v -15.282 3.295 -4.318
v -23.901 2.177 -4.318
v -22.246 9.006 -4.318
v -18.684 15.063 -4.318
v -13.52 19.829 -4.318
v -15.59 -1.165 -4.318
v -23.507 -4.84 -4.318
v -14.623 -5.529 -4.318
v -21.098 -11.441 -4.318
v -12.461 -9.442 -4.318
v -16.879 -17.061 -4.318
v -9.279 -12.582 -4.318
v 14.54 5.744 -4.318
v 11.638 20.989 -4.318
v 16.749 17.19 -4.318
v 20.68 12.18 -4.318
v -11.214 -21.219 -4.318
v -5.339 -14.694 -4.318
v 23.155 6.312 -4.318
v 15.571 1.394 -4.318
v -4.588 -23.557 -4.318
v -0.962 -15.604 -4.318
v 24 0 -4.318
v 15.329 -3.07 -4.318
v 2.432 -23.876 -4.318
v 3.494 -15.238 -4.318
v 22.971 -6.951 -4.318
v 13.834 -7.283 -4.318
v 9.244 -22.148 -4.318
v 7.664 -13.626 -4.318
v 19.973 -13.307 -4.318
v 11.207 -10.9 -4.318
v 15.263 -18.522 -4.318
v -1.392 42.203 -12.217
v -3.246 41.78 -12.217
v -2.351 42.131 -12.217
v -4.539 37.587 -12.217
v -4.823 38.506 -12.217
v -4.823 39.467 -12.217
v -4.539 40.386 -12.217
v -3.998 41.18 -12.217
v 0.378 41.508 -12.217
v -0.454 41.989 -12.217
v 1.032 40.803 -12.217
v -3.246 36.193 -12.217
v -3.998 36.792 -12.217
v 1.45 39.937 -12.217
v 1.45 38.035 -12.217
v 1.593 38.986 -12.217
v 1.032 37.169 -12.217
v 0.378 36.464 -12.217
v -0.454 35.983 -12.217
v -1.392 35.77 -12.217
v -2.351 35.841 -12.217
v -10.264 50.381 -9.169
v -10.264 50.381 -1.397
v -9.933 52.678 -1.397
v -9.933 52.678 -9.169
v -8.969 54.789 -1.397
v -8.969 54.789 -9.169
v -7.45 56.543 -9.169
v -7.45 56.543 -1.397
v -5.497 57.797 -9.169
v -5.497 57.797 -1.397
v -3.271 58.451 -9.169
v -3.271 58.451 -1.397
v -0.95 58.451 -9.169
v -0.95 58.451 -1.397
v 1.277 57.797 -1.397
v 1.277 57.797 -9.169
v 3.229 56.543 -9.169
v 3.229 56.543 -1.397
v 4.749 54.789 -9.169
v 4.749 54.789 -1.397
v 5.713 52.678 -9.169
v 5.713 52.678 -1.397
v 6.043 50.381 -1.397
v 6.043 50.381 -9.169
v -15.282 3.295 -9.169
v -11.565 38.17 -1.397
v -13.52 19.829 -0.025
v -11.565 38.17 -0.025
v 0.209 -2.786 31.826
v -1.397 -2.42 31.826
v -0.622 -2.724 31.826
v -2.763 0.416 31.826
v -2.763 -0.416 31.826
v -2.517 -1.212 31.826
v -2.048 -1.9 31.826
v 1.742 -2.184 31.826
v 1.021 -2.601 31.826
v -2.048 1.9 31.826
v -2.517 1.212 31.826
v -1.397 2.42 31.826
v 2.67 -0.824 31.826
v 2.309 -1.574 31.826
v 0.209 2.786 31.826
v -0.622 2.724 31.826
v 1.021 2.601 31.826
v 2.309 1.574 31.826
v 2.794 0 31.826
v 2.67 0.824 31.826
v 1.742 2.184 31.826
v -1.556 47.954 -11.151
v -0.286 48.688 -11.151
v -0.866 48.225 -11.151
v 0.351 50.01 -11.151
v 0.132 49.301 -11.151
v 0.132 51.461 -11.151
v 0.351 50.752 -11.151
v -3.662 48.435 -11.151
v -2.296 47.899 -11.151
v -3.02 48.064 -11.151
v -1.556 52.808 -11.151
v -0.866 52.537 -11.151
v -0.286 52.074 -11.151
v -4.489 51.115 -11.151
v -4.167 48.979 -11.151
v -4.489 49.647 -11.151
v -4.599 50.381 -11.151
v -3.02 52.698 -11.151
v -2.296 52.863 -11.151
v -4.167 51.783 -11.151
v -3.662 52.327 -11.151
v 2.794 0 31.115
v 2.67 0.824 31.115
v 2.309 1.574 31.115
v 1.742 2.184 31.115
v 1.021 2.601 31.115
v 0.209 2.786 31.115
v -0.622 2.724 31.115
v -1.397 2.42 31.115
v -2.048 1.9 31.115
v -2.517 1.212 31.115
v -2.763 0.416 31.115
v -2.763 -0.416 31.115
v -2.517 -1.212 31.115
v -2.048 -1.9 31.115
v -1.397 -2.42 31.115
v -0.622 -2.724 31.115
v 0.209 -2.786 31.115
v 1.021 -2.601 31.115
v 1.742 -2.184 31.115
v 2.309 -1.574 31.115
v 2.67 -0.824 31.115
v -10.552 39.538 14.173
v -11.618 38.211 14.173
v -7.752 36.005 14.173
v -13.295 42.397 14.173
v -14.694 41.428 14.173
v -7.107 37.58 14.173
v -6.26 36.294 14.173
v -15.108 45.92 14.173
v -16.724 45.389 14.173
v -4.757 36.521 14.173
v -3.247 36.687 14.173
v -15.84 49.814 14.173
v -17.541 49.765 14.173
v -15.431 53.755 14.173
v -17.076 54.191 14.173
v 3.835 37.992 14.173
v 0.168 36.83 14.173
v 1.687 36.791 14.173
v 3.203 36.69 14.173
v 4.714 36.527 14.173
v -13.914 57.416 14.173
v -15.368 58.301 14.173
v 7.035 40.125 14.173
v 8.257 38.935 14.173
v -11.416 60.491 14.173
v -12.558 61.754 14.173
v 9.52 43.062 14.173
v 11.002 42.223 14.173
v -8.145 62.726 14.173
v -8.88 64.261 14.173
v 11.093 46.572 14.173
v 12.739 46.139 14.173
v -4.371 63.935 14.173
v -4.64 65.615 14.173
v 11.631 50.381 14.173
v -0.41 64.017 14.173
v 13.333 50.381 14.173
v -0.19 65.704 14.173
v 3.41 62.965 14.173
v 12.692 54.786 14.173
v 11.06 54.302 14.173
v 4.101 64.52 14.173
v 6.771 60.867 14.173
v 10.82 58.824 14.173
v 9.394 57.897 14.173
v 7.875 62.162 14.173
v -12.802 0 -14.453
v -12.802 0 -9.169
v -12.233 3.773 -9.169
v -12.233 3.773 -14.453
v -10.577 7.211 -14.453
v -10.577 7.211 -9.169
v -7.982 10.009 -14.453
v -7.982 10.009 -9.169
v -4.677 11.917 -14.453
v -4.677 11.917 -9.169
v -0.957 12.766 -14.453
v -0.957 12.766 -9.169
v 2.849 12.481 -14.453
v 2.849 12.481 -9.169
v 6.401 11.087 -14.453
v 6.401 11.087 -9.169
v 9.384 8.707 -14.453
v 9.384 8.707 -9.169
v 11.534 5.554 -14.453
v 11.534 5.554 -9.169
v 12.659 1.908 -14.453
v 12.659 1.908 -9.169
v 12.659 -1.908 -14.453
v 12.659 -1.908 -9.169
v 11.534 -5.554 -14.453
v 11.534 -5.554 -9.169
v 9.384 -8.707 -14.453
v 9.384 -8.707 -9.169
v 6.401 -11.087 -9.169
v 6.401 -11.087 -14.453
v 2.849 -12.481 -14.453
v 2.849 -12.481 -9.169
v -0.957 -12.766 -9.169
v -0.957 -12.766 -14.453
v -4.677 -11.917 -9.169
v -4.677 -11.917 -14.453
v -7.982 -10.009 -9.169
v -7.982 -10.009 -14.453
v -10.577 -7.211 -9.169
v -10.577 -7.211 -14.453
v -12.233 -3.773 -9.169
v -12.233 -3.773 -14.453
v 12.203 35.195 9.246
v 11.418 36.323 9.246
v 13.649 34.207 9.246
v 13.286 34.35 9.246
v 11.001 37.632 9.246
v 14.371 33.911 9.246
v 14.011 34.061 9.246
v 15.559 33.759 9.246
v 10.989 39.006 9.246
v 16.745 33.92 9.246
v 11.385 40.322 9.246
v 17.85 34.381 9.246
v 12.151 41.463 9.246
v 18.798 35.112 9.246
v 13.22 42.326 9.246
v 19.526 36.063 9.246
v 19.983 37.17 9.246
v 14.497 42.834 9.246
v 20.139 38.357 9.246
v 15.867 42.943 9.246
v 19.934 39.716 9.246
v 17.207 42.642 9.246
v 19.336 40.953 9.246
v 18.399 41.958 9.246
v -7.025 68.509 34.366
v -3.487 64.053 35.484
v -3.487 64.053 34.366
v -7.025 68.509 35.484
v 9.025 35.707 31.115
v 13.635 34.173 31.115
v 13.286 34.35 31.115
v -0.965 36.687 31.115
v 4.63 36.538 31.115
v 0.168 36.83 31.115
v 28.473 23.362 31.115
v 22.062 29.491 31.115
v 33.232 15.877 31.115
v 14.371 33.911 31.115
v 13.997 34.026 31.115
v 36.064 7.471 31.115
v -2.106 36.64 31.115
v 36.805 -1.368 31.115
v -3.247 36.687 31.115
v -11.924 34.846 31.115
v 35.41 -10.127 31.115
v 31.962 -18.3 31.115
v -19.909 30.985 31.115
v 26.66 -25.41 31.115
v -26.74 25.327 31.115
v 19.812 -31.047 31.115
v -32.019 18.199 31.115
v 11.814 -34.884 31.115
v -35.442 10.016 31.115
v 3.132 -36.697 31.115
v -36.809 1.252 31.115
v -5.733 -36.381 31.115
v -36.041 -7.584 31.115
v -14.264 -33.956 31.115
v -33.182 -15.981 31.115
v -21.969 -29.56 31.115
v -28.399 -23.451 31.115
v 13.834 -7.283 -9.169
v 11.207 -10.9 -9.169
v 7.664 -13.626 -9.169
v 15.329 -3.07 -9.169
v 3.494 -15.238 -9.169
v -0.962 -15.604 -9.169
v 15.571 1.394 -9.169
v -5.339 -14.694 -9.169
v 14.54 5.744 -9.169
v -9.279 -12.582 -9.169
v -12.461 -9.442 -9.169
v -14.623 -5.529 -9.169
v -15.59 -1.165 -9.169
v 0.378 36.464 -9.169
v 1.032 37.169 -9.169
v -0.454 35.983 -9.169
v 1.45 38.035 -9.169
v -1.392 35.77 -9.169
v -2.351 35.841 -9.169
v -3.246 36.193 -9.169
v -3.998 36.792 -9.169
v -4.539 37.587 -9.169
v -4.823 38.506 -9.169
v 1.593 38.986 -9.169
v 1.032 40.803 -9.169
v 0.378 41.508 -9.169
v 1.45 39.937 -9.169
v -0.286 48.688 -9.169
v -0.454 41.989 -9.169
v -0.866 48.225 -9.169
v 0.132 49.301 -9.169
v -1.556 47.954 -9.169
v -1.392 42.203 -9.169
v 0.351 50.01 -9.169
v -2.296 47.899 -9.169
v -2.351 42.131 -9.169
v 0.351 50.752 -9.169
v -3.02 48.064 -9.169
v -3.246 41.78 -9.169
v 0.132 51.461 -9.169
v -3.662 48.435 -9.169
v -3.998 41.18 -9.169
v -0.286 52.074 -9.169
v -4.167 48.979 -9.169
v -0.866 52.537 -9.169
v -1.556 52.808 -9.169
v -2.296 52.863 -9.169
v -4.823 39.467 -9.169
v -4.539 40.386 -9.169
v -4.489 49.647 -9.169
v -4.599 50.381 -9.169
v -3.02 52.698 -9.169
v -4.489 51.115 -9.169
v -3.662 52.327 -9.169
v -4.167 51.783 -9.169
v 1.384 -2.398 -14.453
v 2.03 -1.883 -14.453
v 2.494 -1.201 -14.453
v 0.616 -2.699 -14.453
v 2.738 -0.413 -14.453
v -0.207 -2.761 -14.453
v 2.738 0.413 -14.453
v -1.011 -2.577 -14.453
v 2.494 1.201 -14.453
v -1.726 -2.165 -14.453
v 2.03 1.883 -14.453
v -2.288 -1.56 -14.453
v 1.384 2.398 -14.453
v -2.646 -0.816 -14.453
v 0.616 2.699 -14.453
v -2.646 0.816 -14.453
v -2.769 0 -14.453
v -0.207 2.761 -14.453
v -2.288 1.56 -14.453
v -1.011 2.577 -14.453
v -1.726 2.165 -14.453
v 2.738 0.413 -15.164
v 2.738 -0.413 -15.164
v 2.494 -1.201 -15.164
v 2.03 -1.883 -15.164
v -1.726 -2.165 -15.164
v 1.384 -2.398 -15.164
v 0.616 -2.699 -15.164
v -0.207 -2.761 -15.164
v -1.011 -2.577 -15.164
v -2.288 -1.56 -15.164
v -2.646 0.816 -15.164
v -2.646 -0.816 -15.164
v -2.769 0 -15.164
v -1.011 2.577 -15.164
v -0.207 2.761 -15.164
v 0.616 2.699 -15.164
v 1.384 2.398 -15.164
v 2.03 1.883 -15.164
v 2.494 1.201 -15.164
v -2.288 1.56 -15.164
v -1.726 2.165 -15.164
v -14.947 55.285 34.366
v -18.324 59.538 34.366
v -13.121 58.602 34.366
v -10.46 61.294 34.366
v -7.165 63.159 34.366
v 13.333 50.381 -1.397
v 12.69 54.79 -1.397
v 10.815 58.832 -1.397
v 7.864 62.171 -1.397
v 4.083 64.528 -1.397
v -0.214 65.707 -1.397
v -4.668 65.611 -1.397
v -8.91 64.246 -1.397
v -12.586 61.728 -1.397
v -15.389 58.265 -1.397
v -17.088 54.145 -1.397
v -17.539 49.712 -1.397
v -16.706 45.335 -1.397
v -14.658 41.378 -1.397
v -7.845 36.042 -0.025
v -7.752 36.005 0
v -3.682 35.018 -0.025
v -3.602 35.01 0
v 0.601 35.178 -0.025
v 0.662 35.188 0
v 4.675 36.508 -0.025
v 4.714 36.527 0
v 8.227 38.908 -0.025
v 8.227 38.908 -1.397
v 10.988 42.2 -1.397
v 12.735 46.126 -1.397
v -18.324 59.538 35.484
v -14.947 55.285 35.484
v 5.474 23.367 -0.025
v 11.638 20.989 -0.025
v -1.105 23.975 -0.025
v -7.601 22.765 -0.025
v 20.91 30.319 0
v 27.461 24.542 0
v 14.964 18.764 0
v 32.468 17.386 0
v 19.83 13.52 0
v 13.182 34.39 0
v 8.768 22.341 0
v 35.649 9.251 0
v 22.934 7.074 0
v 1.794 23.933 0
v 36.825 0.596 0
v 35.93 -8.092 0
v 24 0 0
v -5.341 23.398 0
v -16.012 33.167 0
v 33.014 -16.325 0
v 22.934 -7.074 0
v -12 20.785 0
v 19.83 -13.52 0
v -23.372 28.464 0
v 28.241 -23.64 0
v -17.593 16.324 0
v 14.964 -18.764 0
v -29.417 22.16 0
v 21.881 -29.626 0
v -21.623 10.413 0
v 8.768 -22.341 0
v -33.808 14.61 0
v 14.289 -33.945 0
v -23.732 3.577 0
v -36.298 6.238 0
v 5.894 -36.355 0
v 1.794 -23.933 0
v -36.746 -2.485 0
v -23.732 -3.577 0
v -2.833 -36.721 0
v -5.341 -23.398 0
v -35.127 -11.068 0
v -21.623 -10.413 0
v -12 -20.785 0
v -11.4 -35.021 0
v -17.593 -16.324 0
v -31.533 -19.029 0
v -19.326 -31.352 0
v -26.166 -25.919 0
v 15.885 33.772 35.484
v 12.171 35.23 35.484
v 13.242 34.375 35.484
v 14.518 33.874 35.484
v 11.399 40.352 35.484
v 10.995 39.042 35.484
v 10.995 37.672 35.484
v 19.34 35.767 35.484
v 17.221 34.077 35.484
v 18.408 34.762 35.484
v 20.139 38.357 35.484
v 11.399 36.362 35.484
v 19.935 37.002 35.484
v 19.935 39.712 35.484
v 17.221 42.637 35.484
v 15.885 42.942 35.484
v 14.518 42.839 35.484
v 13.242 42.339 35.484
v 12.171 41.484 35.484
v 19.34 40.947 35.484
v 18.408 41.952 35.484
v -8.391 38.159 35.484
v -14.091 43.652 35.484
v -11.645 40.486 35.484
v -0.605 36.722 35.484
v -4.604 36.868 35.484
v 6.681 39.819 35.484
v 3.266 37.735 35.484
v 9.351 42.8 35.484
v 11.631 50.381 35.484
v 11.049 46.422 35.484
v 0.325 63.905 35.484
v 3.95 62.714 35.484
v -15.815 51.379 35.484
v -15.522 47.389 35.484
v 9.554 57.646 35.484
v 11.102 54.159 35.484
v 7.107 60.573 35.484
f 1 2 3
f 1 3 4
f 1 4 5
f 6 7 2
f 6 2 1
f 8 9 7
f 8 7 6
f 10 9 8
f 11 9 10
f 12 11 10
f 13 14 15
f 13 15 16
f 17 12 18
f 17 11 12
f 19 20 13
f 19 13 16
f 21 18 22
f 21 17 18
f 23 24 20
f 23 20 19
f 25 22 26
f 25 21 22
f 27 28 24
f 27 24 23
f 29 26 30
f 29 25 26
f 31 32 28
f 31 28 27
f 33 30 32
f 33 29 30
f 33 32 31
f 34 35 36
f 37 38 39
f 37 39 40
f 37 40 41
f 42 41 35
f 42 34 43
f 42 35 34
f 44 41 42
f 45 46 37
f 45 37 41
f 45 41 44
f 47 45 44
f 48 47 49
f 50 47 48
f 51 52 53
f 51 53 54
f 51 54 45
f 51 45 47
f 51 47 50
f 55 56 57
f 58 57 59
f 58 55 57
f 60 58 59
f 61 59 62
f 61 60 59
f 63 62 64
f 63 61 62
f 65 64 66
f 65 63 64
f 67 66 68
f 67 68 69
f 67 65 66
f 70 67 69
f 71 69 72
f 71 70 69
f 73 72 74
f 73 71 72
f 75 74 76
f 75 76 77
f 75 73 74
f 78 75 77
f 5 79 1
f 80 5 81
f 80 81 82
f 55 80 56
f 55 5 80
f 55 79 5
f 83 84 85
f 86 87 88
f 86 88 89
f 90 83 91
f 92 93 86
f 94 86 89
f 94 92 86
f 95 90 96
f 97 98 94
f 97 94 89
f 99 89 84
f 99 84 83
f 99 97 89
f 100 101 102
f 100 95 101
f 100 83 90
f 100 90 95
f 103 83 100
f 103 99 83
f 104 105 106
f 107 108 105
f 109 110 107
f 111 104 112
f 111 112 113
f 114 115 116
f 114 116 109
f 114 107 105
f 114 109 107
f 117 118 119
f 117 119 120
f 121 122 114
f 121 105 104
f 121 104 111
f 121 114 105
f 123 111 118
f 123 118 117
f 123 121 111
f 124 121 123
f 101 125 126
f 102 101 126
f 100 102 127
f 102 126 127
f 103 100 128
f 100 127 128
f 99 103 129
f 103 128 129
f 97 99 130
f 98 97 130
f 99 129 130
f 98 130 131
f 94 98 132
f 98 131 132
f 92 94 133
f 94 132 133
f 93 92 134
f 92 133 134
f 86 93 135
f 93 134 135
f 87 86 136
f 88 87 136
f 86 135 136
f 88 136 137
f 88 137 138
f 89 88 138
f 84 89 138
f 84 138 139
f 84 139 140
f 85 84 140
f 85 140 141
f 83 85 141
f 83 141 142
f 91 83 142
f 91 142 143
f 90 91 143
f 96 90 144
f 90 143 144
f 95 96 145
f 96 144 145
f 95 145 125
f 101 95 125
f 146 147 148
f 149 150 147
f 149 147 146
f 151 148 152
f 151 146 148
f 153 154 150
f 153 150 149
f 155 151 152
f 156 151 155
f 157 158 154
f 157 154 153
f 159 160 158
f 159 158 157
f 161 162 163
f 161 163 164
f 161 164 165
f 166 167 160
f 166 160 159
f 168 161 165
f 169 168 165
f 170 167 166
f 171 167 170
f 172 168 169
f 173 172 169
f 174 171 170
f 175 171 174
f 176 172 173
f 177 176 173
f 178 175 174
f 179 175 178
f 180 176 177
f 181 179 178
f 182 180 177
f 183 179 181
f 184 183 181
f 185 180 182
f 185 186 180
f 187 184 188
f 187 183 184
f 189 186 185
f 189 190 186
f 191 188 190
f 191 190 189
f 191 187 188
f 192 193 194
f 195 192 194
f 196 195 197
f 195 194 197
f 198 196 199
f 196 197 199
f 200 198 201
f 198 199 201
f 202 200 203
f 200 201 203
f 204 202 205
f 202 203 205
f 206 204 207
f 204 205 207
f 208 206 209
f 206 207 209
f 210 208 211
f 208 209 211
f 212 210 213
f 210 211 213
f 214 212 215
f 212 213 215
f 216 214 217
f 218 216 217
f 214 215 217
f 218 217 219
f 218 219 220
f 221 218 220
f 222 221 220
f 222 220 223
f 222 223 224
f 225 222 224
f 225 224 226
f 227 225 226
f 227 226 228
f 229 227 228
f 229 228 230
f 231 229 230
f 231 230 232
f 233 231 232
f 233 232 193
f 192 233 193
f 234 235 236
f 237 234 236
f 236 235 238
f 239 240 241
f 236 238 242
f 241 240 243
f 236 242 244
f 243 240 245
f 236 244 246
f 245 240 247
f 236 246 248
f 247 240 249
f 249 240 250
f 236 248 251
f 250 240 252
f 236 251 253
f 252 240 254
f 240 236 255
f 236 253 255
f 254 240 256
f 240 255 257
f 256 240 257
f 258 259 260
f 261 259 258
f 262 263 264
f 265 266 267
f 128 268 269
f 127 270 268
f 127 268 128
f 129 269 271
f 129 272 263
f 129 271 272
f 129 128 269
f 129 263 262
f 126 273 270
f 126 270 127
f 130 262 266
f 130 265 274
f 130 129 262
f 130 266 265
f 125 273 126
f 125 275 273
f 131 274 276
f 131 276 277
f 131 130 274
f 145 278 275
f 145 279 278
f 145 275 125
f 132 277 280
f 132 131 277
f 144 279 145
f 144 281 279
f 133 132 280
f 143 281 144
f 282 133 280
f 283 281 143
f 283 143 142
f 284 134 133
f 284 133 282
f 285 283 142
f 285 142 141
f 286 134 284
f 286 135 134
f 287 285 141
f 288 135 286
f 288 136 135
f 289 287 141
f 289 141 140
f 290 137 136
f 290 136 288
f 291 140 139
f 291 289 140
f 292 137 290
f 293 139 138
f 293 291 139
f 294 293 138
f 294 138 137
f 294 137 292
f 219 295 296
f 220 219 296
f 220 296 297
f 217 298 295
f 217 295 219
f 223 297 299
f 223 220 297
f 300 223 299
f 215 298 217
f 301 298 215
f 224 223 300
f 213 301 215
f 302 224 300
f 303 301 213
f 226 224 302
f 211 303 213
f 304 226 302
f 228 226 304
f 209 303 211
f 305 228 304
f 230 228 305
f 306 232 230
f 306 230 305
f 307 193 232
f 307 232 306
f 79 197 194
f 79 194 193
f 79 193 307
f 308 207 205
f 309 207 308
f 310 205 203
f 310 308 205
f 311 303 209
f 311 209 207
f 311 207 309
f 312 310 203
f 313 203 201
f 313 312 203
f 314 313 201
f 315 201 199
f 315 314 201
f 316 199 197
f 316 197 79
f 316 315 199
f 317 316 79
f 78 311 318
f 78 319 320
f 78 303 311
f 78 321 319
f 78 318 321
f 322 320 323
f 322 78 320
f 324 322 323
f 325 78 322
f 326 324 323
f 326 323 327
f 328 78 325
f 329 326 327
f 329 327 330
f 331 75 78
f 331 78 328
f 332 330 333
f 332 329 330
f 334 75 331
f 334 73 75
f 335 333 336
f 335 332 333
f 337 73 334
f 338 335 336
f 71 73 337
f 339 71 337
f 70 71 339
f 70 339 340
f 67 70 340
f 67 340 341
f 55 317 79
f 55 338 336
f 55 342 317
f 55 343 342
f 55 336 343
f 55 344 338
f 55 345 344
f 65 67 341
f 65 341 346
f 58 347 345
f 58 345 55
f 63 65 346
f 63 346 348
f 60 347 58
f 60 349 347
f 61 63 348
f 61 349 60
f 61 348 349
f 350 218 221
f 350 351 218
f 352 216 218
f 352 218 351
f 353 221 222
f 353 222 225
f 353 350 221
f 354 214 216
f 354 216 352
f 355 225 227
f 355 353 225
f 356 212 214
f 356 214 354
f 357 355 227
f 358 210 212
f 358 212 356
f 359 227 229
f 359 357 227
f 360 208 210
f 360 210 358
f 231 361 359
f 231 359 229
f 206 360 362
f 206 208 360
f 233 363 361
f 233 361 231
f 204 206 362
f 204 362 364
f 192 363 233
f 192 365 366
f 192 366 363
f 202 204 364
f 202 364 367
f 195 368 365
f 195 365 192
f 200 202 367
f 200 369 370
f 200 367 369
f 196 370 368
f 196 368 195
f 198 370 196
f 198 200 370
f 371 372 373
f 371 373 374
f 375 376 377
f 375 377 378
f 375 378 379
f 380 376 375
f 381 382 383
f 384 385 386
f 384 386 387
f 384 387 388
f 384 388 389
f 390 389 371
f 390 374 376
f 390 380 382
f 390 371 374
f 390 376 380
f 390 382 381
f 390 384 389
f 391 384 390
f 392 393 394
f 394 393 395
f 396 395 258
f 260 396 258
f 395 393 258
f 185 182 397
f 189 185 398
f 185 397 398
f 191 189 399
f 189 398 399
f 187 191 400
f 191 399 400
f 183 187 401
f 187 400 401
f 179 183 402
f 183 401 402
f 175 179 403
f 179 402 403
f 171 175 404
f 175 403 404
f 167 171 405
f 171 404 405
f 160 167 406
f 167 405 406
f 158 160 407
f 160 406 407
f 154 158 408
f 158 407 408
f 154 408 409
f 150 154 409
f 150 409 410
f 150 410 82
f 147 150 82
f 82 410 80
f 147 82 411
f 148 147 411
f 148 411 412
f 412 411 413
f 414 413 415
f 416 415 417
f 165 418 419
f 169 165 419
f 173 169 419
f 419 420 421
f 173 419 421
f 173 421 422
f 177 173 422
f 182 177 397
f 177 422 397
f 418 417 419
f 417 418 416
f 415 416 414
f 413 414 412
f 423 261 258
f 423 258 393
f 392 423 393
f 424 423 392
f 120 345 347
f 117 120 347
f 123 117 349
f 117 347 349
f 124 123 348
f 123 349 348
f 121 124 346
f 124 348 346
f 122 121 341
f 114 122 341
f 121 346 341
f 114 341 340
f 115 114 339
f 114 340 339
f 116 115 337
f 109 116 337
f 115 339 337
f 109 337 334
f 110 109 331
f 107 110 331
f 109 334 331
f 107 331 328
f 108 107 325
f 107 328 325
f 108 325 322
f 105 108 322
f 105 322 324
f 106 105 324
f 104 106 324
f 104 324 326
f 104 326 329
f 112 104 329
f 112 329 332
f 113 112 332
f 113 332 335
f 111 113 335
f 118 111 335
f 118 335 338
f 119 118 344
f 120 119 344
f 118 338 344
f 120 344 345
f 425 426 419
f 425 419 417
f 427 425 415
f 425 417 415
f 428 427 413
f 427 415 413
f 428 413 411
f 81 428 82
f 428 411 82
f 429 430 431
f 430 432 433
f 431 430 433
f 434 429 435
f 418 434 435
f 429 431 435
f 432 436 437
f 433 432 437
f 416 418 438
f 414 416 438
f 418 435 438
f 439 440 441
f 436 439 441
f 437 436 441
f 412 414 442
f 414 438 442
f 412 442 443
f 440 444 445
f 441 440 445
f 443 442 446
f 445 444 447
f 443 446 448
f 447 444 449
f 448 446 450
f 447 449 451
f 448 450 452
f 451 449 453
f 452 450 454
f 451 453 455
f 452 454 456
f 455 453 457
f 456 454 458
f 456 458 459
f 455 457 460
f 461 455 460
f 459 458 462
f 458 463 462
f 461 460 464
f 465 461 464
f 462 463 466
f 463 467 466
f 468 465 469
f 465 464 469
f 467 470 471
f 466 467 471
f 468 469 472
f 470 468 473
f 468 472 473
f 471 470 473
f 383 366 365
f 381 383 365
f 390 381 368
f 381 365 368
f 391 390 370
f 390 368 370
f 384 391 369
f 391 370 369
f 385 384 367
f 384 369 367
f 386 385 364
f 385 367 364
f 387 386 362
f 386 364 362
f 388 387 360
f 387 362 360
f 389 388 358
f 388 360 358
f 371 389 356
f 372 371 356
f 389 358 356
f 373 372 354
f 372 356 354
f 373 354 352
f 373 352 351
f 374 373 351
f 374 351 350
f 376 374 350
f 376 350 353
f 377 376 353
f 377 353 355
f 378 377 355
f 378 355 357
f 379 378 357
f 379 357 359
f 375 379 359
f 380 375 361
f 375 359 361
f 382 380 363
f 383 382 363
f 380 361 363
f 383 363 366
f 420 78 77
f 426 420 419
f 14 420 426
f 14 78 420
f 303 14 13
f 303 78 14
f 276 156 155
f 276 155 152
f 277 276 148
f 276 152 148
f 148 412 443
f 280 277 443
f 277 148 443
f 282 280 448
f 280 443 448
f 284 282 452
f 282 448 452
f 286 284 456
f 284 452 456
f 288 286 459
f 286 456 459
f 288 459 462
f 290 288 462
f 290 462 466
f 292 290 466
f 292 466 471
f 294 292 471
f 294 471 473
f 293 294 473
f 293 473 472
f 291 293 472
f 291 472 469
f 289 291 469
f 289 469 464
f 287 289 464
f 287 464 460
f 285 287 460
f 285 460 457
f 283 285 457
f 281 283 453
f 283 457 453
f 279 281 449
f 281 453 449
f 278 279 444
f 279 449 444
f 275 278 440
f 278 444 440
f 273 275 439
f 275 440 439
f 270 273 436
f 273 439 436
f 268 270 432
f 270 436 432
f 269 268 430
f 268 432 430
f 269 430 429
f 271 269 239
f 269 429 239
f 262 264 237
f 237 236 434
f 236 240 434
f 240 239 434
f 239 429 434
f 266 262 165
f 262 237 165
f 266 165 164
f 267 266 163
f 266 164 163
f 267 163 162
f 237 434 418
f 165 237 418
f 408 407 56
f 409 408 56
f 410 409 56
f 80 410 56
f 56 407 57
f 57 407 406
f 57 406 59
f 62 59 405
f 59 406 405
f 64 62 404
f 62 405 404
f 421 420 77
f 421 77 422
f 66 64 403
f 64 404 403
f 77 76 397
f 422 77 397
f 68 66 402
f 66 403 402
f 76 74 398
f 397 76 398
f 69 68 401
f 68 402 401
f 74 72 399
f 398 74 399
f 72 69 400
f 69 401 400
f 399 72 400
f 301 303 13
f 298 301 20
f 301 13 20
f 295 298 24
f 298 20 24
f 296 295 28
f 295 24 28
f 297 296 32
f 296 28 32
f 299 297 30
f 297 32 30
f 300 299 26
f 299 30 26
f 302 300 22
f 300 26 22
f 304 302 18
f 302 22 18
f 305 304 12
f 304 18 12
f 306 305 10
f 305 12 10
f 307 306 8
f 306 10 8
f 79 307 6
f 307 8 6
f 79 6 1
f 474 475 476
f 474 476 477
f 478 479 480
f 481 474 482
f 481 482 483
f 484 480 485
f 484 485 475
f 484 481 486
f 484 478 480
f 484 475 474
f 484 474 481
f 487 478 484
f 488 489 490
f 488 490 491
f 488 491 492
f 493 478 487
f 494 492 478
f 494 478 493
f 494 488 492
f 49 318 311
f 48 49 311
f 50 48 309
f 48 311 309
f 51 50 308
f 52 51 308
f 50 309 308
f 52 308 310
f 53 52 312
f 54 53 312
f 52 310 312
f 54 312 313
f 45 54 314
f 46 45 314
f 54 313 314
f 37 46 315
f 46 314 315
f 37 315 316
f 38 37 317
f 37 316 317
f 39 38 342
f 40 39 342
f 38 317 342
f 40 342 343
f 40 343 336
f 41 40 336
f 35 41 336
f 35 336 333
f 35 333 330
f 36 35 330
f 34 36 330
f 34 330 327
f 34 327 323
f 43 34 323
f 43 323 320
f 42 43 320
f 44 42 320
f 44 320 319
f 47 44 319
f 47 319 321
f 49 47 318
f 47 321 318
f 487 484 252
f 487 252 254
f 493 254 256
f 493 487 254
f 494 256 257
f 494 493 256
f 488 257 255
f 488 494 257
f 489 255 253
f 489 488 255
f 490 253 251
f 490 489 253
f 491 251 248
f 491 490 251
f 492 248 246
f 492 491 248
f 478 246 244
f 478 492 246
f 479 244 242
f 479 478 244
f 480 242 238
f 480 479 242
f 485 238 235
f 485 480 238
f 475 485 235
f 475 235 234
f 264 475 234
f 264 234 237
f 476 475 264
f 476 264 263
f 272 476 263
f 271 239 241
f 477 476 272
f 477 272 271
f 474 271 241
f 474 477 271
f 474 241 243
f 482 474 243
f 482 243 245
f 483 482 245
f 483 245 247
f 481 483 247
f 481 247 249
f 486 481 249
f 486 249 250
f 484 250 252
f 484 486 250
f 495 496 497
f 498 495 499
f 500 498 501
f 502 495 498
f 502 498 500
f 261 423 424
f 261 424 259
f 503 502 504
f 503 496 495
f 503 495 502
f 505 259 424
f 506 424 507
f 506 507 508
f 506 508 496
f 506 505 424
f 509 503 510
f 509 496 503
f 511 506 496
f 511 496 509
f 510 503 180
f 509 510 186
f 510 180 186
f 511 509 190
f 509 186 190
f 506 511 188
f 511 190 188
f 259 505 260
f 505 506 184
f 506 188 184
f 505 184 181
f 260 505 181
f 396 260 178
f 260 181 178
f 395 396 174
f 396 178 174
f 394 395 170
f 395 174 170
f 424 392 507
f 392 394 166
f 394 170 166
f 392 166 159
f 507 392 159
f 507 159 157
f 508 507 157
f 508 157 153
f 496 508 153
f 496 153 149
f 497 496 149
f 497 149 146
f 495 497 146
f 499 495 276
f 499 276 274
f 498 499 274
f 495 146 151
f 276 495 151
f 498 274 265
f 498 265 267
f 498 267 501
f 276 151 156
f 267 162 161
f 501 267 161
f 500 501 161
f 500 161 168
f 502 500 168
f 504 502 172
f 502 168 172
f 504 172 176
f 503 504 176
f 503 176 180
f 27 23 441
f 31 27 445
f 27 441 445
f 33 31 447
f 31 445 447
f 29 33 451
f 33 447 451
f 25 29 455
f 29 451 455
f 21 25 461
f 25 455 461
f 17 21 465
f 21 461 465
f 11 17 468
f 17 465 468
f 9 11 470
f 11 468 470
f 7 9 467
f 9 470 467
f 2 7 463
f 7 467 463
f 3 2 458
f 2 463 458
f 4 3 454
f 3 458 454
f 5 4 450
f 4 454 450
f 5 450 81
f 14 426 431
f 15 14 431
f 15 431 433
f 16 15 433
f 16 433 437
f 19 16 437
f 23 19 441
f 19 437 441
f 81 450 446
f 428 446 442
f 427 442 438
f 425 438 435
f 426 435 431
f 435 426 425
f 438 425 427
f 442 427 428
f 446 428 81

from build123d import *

# Parameters (mm, degrees)
SKETCH1_R            = 36.83
BOSS_EXTRUDE1_DEPTH  = 31.115
SKETCH2_R            = 24
BOSS_EXTRUDE2_DEPTH  = 4.318
SKETCH5_R            = 2.794
BOSS_EXTRUDE5_DEPTH  = 0.7112
SKETCH14_R           = 15.6337
BOSS_EXTRUDE11_DEPTH = 4.8514
SKETCH15_R           = 12.8016
BOSS_EXTRUDE12_DEPTH = 5.2832
SKETCH16_R           = 2.7686
BOSS_EXTRUDE13_DEPTH = 0.7112
SKETCH17_R           = 8.1534
BOSS_EXTRUDE14_DEPTH = 7.7724
SKETCH18_R           = 15.4432
BOSS_EXTRUDE15_DEPTH = 15.5702
SKETCH19_R           = 13.7414
BOSS_EXTRUDE16_DEPTH = 21.3106
BOSS_EXTRUDE17_DEPTH = 9.144
SKETCH24_R           = 2.4892
BOSS_EXTRUDE18_DEPTH = 1.9812
SKETCH25_R           = 3.2258
BOSS_EXTRUDE19_DEPTH = 3.048
SKETCH27_R           = 4.59774385
BOSS_EXTRUDE20_DEPTH = 26.2382
BOSS_EXTRUDE21_DEPTH = 1.1176


with BuildPart() as part:
    # Sketch1 → Boss-Extrude1 (new body)
    with BuildSketch(Plane.XY):
        with Locations(Location((0, 0, 0), (0, 0, 180))):
            Circle(SKETCH1_R)
    extrude(amount=BOSS_EXTRUDE1_DEPTH)

    # Sketch2 → Boss-Extrude2 (add)
    with BuildSketch(Plane(origin=(0, 0, 0), x_dir=(-1, 0, 0), z_dir=(0, 0, -1))):
        with Locations(Location((0, 0, 0), (0, 0, 180))):
            Circle(SKETCH2_R)
    extrude(amount=BOSS_EXTRUDE2_DEPTH)

    # Sketch5 → Boss-Extrude5 (add)
    with BuildSketch(Plane.XY.offset(31.115)):
        Circle(SKETCH5_R)
    extrude(amount=BOSS_EXTRUDE5_DEPTH)

    # Sketch14 → Boss-Extrude11 (add)
    with BuildSketch(Plane(origin=(0, 0, -4.318), x_dir=(-1, 0, 0), z_dir=(0, 0, -1))):
        Circle(SKETCH14_R)
    extrude(amount=BOSS_EXTRUDE11_DEPTH)

    # Sketch15 → Boss-Extrude12 (add)
    with BuildSketch(Plane(origin=(0, 0, -9.1694), x_dir=(-1, 0, 0), z_dir=(0, 0, -1))):
        Circle(SKETCH15_R)
    extrude(amount=BOSS_EXTRUDE12_DEPTH)

    # Sketch16 → Boss-Extrude13 (add)
    with BuildSketch(Plane(origin=(0, 0, -14.4526), x_dir=(-1, 0, 0), z_dir=(0, 0, -1))):
        Circle(SKETCH16_R)
    extrude(amount=BOSS_EXTRUDE13_DEPTH)



with BuildPart() as body_2:
    # Sketch17 → Boss-Extrude14 (new body)
    with BuildSketch(Plane(origin=(0, 0, -9.1694), x_dir=(-1, 0, 0), z_dir=(0, 0, -1))):
        with Locations((2.110216379, 50.3809)):
            Circle(SKETCH17_R)
    extrude(amount=-BOSS_EXTRUDE14_DEPTH)

    # Sketch18 → Boss-Extrude15 (add)
    with BuildSketch(Plane.XY.offset(-1.397)):
        with Locations((-2.110216379, 50.3809)):
            Circle(SKETCH18_R)
    extrude(amount=BOSS_EXTRUDE15_DEPTH)

    # Sketch19 → Boss-Extrude16 (add)
    with BuildSketch(Plane.XY.offset(14.1732)):
        with Locations((-2.110216379, 50.3809)):
            Circle(SKETCH19_R)
    extrude(amount=BOSS_EXTRUDE16_DEPTH)


with BuildPart() as part_1:
    add(part.part)

    add(body_2.part)  # Boss-Extrude17 merges body 2
    # Sketch23 → Boss-Extrude17 (add)
    with BuildSketch(Plane(origin=(0, 0, -9.1694), x_dir=(-1, 0, 0), z_dir=(0, 0, -1))):
        Polygon((15.6337, 0), (10.263616379, 50.3809), (-6.043183621, 50.3809), (-15.6337, 0), align=None)
    extrude(amount=-BOSS_EXTRUDE17_DEPTH)

    # Sketch24 → Boss-Extrude18 (add)
    with BuildSketch(Plane(origin=(0, 0, -9.1694), x_dir=(-1, 0, 0), z_dir=(0, 0, -1))):
        with Locations((2.110216379, 50.3809)):
            Circle(SKETCH24_R)
    extrude(amount=BOSS_EXTRUDE18_DEPTH)

    # Sketch25 → Boss-Extrude19 (add)
    with BuildSketch(Plane(origin=(0, 0, -9.1694), x_dir=(-1, 0, 0), z_dir=(0, 0, -1))):
        with Locations(Location((1.632950373, 38.986290822, 0), (0, 0, 180))):
            Circle(SKETCH25_R)
    extrude(amount=BOSS_EXTRUDE19_DEPTH)

    # Sketch27 → Boss-Extrude20 (add)
    with BuildSketch(Plane.XY.offset(35.4838)):
        with Locations((15.541092999, 38.356894356)):
            Circle(SKETCH27_R)
    extrude(amount=-BOSS_EXTRUDE20_DEPTH)

    # Sketch29 → Boss-Extrude21 (add)
    with BuildSketch(Plane.XY.offset(35.4838)):
        Polygon((-3.486888815, 64.053165612), (-7.024727103, 68.509088458), (-18.323674319, 59.53814137), (-14.946759387, 55.284902198), align=None)
    extrude(amount=-BOSS_EXTRUDE21_DEPTH)


solid = part_1.part
